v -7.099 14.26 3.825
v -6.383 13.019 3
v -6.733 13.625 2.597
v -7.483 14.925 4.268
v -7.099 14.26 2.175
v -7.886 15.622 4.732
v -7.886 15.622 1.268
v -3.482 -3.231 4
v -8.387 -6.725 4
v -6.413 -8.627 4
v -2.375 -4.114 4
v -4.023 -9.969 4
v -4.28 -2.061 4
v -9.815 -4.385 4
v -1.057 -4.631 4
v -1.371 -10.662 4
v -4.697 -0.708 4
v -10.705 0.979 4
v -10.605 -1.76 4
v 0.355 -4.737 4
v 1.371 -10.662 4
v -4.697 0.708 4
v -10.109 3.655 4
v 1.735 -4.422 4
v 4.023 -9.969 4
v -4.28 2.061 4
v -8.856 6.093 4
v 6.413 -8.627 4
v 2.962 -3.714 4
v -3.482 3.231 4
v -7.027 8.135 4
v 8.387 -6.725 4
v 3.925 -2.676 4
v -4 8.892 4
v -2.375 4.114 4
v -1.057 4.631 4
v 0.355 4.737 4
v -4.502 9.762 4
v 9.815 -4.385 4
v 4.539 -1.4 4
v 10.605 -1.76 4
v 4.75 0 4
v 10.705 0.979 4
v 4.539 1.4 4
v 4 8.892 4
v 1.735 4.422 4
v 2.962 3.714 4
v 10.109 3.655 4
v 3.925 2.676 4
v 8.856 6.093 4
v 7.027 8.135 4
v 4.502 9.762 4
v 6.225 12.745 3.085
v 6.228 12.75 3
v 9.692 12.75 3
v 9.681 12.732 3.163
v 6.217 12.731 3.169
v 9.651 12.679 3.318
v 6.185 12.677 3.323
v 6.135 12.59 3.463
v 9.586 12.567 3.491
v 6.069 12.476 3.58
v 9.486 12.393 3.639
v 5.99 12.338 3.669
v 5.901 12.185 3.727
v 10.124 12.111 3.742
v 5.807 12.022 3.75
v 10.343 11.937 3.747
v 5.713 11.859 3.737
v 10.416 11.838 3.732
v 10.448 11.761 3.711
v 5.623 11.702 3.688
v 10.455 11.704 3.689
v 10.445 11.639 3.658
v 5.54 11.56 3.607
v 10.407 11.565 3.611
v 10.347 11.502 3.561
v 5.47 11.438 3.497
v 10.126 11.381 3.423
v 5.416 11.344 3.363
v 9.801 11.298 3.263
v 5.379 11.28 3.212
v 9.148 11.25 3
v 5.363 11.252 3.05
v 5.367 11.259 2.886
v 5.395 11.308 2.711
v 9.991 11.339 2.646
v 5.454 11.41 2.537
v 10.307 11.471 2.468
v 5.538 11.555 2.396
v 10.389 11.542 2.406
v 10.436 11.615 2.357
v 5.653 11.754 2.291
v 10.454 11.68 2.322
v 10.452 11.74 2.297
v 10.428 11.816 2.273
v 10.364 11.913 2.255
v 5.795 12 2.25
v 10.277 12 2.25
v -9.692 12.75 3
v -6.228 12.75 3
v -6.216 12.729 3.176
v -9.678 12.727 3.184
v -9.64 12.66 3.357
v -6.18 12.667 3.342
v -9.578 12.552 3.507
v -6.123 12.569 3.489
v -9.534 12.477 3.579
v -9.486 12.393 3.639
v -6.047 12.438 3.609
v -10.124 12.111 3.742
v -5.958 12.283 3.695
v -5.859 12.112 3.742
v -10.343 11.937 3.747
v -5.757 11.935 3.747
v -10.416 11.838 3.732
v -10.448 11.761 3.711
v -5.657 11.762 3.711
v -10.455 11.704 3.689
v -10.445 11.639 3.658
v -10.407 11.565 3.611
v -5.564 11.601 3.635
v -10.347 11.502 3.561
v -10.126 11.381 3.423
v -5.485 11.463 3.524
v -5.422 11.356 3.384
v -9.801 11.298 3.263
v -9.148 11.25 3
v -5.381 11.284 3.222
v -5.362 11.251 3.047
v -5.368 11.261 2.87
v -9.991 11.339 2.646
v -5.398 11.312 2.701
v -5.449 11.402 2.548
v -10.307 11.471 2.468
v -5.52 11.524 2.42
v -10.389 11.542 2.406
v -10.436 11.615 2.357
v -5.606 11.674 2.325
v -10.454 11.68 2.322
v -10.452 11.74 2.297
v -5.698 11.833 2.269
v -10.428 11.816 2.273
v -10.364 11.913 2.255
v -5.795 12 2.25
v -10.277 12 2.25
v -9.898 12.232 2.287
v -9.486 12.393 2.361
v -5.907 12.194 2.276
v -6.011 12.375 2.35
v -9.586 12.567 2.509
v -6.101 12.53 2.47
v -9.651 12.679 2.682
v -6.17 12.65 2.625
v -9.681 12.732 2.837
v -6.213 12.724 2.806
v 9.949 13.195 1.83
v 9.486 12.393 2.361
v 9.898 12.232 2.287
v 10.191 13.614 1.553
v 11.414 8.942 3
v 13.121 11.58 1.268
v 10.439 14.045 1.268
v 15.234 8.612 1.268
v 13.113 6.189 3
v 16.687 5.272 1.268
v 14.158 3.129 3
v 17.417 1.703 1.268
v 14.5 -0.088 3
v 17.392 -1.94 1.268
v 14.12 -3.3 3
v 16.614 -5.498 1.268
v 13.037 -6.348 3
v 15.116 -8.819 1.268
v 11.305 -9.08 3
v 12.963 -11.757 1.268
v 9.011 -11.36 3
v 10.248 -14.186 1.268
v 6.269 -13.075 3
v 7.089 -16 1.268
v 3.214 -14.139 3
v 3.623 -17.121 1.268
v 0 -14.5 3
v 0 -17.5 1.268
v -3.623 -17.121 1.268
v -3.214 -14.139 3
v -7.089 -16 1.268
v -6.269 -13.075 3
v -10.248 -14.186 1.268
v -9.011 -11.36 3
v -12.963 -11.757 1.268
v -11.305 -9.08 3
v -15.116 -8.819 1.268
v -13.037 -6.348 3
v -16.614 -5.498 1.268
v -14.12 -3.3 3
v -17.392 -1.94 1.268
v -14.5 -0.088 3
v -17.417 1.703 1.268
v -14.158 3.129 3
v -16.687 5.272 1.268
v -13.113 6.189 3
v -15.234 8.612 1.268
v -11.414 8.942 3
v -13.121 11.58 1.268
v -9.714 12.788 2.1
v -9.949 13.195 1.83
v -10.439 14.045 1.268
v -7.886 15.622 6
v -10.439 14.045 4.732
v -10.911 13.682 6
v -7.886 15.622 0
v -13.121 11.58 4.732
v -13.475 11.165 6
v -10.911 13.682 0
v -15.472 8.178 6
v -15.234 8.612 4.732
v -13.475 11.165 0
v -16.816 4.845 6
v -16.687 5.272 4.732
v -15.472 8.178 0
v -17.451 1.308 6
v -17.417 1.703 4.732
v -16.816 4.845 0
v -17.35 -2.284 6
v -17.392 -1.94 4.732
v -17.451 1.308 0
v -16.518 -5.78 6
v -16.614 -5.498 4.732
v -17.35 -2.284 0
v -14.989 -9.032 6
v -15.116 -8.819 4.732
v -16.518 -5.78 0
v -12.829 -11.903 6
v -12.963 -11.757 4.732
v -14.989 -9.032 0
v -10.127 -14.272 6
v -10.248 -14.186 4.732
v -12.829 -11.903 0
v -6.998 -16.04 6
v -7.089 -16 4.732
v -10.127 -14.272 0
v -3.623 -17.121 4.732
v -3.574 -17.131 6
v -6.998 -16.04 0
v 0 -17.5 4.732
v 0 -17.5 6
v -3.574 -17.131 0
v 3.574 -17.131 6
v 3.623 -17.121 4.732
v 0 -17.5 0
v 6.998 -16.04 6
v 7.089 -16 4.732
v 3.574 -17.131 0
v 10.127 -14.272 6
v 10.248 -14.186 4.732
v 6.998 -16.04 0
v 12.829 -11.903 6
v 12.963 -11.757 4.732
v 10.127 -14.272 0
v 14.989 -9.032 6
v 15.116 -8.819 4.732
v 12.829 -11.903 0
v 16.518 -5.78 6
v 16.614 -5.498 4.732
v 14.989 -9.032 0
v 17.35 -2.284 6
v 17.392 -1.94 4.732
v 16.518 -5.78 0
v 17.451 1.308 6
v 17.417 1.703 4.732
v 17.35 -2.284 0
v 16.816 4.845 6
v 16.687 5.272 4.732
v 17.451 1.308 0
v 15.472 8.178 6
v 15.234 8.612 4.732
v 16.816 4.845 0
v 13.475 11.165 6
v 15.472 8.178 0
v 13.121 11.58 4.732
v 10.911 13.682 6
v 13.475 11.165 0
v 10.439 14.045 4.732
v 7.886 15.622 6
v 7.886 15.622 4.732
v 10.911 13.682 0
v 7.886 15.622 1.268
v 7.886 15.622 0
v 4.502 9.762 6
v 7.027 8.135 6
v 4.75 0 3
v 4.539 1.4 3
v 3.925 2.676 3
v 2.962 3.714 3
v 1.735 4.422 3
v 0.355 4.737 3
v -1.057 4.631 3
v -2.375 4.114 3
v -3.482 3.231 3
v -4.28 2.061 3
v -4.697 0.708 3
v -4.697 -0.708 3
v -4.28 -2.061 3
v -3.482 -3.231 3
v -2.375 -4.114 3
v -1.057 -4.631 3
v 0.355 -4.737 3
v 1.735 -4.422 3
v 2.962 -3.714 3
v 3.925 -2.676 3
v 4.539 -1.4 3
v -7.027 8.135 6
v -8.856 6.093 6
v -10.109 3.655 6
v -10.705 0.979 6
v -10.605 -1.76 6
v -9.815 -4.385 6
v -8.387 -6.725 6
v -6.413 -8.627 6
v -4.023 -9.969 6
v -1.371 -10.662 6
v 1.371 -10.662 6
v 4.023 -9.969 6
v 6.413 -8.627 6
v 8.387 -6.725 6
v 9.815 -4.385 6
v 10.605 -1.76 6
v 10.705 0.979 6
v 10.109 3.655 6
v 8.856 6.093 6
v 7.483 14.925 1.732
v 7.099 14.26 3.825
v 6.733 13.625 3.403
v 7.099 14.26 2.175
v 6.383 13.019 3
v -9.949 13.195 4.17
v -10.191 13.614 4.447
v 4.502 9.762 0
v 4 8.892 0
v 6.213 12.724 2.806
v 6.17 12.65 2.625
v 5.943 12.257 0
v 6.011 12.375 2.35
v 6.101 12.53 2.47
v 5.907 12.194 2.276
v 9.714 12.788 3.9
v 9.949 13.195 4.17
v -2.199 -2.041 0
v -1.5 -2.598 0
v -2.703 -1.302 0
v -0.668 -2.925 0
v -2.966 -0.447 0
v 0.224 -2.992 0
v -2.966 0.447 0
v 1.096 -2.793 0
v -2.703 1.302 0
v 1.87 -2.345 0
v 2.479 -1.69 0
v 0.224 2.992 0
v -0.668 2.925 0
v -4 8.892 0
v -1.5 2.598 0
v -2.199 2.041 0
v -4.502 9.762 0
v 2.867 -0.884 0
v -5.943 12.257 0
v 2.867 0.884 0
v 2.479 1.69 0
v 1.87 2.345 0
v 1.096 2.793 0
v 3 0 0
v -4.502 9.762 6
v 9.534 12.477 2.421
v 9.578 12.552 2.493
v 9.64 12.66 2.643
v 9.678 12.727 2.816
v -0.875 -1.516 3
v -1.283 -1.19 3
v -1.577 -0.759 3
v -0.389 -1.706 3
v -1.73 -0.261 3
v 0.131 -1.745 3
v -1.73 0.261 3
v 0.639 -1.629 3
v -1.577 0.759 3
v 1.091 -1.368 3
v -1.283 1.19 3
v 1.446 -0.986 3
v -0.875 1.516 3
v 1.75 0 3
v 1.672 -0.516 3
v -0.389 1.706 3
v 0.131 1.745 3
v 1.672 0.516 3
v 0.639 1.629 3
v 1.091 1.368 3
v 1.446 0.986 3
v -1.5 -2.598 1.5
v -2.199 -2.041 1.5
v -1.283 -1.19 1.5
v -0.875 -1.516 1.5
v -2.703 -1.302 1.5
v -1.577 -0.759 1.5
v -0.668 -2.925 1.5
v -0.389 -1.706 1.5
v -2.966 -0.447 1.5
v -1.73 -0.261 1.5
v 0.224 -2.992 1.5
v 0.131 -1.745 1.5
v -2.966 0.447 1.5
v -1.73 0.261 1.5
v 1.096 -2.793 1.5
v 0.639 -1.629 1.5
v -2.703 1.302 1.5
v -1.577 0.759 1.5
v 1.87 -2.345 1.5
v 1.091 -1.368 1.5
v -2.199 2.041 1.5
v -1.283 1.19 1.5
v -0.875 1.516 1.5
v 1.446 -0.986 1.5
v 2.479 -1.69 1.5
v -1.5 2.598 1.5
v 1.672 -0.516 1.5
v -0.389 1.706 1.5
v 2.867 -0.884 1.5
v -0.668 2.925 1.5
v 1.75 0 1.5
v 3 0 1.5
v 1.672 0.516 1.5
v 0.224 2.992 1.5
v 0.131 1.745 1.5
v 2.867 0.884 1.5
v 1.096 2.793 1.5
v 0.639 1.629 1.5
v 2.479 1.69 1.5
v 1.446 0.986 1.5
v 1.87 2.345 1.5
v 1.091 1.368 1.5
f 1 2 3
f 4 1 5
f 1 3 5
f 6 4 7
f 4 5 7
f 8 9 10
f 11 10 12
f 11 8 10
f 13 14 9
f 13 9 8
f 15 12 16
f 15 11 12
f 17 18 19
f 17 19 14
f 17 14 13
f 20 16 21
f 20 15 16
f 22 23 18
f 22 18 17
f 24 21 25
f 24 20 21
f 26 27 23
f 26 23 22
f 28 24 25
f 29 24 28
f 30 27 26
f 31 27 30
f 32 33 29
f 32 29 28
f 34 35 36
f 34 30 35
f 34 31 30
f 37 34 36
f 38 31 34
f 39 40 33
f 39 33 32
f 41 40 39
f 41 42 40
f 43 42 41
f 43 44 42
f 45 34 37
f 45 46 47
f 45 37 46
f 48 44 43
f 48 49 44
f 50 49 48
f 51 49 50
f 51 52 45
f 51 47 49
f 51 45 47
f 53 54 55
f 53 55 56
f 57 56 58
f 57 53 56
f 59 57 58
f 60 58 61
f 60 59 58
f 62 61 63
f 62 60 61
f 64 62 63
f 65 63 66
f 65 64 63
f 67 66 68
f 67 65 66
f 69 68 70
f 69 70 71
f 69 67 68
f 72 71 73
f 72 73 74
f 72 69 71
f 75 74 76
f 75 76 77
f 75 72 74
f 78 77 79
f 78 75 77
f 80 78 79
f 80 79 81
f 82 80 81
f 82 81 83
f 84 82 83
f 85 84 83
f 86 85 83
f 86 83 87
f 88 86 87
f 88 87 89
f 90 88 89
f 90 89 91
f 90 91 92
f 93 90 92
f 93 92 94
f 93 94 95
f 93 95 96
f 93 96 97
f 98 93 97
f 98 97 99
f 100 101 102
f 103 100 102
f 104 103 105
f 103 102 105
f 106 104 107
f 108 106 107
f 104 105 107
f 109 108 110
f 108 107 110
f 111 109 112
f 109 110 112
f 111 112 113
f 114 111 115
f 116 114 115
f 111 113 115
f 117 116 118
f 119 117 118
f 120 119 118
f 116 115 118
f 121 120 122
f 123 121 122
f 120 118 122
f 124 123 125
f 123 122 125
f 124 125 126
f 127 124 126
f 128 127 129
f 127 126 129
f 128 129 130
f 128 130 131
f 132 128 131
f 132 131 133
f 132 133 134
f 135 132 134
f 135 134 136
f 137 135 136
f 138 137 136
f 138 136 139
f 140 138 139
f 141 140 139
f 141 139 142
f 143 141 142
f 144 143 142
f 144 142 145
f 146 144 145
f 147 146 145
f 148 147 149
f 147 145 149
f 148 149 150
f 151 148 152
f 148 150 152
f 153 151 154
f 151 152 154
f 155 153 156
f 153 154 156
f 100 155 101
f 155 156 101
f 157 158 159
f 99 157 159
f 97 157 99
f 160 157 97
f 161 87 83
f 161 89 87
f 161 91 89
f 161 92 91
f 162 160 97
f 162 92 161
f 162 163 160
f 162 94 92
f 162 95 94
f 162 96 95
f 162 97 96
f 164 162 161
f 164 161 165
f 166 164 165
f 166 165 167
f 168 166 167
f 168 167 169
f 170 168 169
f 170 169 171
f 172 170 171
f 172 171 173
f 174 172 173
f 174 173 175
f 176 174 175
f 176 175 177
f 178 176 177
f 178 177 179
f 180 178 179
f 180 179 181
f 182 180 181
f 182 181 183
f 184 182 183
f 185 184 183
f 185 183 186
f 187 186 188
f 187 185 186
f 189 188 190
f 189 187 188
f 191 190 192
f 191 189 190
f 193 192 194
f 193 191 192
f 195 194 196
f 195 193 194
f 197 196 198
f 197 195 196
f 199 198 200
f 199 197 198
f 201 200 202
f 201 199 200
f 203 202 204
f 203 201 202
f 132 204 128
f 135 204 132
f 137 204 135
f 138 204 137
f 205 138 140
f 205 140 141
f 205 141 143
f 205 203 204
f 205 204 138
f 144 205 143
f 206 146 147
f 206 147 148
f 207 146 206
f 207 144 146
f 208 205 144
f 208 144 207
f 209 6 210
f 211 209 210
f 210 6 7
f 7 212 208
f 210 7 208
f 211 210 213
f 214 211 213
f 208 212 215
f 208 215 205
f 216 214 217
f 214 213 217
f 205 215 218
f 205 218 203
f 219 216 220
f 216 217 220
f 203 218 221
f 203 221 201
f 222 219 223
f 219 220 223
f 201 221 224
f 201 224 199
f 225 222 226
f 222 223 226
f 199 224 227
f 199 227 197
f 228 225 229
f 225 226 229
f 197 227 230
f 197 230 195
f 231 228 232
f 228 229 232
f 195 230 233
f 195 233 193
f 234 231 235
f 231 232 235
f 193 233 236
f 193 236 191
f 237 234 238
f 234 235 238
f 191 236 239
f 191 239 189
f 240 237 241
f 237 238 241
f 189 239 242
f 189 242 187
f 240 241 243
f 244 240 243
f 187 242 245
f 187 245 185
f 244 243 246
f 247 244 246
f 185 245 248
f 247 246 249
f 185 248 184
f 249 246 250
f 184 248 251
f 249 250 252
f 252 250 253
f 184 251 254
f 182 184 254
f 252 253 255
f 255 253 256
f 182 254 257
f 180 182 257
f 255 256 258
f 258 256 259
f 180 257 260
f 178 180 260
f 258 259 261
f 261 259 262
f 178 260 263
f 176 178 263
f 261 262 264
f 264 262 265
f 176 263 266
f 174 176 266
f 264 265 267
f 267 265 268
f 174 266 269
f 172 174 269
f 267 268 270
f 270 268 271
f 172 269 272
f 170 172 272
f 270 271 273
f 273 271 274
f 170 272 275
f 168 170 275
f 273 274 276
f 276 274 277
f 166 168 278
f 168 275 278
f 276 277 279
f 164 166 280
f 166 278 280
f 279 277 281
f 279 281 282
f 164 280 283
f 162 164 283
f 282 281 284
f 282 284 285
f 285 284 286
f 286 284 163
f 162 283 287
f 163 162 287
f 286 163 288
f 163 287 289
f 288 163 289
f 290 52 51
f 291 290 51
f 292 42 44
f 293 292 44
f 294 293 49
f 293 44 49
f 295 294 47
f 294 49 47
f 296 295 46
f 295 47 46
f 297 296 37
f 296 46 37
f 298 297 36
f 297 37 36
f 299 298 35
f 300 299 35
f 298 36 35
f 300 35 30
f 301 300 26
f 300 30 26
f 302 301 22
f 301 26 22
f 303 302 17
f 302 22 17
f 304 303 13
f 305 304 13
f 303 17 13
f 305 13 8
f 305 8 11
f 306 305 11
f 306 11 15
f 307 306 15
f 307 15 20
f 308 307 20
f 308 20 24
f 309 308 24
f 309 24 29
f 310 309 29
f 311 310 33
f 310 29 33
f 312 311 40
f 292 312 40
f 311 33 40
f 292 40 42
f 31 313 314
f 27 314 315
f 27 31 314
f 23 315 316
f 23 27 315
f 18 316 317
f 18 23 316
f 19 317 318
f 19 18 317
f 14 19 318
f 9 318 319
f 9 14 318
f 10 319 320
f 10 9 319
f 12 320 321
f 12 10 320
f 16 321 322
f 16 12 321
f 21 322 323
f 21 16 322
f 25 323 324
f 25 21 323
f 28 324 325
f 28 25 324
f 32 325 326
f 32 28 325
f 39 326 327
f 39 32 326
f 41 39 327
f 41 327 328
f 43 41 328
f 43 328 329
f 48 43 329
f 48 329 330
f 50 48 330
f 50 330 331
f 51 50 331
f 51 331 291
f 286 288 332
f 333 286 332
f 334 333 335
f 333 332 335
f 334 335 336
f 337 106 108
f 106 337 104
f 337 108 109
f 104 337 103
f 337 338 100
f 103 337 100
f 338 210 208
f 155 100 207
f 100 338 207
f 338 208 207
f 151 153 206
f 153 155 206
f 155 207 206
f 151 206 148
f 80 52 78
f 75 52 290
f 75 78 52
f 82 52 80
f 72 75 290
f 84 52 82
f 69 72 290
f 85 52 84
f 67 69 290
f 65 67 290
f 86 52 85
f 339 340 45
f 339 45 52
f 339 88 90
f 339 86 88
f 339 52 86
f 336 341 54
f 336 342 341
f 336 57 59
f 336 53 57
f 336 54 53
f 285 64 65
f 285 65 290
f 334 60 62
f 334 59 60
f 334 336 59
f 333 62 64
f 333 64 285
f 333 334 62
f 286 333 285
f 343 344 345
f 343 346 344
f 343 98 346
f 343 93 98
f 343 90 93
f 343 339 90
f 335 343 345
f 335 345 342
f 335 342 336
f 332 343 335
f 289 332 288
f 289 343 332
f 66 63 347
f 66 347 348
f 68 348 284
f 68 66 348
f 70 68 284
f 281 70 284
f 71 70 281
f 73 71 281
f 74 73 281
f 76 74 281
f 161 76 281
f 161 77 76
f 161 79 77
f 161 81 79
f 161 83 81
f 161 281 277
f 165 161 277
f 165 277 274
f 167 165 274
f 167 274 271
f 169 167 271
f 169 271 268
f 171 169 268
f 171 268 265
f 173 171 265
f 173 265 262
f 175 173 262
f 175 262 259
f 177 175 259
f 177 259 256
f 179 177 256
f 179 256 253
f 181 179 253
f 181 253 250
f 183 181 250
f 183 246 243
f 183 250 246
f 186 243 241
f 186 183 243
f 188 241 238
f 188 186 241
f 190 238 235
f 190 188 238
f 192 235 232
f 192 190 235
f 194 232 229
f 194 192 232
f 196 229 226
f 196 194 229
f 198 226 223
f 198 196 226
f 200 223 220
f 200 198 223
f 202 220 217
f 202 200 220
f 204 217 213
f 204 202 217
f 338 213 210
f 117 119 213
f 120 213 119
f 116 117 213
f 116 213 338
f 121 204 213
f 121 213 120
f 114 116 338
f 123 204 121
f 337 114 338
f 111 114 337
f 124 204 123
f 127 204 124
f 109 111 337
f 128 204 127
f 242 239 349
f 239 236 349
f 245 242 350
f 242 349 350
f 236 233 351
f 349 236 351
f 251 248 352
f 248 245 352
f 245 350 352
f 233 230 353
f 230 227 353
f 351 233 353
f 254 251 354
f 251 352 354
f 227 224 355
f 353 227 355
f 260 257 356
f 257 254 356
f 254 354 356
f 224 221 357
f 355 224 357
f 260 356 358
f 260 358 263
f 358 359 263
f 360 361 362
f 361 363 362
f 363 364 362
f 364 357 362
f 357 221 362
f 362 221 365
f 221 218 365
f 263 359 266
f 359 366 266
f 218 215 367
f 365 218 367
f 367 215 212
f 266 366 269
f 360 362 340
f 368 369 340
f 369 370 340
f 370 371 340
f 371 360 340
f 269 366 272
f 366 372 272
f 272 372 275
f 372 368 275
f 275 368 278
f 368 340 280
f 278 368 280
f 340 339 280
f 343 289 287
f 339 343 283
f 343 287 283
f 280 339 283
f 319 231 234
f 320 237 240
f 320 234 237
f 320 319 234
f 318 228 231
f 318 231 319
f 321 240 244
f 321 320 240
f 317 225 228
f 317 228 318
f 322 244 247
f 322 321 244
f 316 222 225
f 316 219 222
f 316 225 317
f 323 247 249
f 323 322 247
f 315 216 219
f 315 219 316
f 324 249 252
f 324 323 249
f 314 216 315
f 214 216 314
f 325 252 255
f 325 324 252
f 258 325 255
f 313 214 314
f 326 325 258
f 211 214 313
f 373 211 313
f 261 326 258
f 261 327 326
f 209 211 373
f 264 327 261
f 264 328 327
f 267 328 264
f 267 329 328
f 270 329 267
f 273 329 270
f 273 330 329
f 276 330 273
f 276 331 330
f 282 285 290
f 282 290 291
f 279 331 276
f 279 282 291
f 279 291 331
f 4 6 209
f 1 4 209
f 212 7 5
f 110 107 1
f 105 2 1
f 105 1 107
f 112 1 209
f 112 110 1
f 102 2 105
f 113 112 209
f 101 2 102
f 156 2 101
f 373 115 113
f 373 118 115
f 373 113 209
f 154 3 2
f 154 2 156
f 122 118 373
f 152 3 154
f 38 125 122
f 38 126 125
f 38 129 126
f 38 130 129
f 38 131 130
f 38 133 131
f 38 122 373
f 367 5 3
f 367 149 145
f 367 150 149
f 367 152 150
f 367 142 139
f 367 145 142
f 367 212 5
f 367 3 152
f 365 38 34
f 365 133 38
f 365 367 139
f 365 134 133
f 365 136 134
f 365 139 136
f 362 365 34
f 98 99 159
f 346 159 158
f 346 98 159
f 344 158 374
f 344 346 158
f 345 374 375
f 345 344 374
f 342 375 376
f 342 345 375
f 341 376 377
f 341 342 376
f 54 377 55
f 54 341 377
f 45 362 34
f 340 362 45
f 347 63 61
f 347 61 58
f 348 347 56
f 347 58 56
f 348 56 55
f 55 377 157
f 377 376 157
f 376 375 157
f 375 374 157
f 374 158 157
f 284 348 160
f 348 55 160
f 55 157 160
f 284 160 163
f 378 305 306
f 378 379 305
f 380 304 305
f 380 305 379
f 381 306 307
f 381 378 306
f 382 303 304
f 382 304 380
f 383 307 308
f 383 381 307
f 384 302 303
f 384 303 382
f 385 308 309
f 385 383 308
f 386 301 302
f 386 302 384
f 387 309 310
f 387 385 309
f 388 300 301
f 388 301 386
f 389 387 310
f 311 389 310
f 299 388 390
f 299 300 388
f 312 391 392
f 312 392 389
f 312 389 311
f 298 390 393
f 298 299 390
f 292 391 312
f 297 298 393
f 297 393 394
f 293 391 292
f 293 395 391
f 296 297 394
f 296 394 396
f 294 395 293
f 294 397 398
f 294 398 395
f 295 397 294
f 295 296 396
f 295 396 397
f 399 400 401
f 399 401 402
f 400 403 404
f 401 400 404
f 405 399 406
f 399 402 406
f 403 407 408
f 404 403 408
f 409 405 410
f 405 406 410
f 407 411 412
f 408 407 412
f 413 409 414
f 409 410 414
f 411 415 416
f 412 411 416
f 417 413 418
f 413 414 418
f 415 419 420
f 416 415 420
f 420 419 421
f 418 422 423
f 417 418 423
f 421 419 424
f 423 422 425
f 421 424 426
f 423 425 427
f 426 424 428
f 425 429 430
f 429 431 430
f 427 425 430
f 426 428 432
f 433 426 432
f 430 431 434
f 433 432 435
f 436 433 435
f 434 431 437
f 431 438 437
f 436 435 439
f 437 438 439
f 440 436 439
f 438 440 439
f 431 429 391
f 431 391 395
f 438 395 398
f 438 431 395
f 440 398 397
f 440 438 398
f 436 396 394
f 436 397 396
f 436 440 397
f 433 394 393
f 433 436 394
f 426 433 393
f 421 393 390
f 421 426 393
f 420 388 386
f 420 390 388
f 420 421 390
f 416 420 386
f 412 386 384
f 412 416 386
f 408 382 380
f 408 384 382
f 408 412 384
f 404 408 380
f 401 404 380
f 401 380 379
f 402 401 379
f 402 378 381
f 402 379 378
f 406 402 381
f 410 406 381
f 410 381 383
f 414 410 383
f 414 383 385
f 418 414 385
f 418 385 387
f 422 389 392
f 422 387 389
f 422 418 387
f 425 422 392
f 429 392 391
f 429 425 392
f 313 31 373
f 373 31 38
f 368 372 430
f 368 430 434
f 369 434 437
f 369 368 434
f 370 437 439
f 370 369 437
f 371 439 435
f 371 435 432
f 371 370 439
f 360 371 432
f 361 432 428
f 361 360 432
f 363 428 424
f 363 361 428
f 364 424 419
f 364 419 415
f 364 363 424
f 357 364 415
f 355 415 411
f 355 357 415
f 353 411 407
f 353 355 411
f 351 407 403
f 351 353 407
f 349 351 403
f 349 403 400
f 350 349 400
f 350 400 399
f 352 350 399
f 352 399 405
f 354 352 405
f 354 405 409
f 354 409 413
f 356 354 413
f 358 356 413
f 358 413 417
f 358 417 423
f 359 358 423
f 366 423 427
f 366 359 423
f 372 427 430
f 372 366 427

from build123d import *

# Parameters (mm, degrees)
F0_R      = 17.5
F0_R_2    = 10.75
F1_DEPTH  = 6
F2_R      = 10.75
F2_R_2    = 1.75
F3_DEPTH  = 4
F8_DEPTH  = 6
F9_DEPTH  = 6
F11_DEPTH = 50
F12_R     = 4.75
F13_DEPTH = 1
F14_R     = 3
F15_DEPTH = 1.5


with BuildPart() as f1:
    # F0 (on Top) → F1 (new body)
    with BuildSketch(Plane.XY):
        Circle(F0_R)
        Circle(F0_R_2, mode=Mode.SUBTRACT)
    extrude(amount=F1_DEPTH)

    # F2 (on Top) → F3 (join)
    with BuildSketch(Plane.XY):
        Circle(F2_R)
        Circle(F2_R_2, mode=Mode.SUBTRACT)
    extrude(amount=F3_DEPTH)

    # F5: sweep along a path in F5_path
    with BuildLine(Plane(origin=(17.5, 0, 6), x_dir=(0, -1, 0), z_dir=(0, 0, -1))) as f5_path:
        CenterArc((0, 17.5), 17.5, 0, 360)
    # F4 (on Front) → F5 (sweep, cut)
    with BuildSketch(Plane.XZ):
        Polygon((17.5310889132, 4.75), (14.5, 3), (17.5310889132, 1.25), align=None)
    sweep(path=f5_path.line, mode=Mode.SUBTRACT)

    # F6 (on Top) → F8 (cut)
    with BuildSketch(Plane.XY):
        with BuildLine():
            Line((-4, 8.8917096219), (4, 8.8917096219))
            ThreePointArc((4, 8.8917096219), (0, 9.75), (-4, 8.8917096219))
        make_face()
        with BuildLine():
            ThreePointArc((-4, 8.8917096219), (0, 9.75), (4, 8.8917096219))
            Line((4, 8.8917096219), (9.5, 18.4179890635))
            Line((9.5, 18.4179890635), (-9.5, 18.4179890635))
            Line((-9.5, 18.4179890635), (-4, 8.8917096219))
        make_face()
    extrude(amount=F8_DEPTH, mode=Mode.SUBTRACT)

    # F7 (on Top) → F9 (join)
    with BuildSketch(Plane.XY):
        with BuildLine():
            Line((-5.942998404, 12.2570815767), (-7.8859968081, 15.6224535315))
            ThreePointArc((-7.8859968081, 15.6224535315), (-9.1966080897, 14.8886668189), (-10.4394679259, 14.0451952433))
            Line((-10.4394679259, 14.0451952433), (-8.5410746154, 10.7570815767))
            Line((-8.5410746154, 10.7570815767), (-5.942998404, 12.2570815767))
        make_face()
        with BuildLine():
            Line((5.942998404, 12.2570815767), (4.5023149906, 9.761744707))
            ThreePointArc((4.5023149906, 9.761744707), (5.8218855082, 9.037043163), (7.027274843, 8.1351034585))
            Line((7.027274843, 8.1351034585), (8.5410746154, 10.7570815767))
            Line((8.5410746154, 10.7570815767), (5.942998404, 12.2570815767))
        make_face()
        with BuildLine():
            ThreePointArc((7.027274843, 8.1351034585), (5.8218855082, 9.037043163), (4.5023149906, 9.761744707))
            Line((4.5023149906, 9.761744707), (7.027274843, 8.1351034585))
        make_face()
        with BuildLine():
            Line((-4.5023149906, 9.761744707), (-5.942998404, 12.2570815767))
            Line((-5.942998404, 12.2570815767), (-8.5410746154, 10.7570815767))
            Line((-8.5410746154, 10.7570815767), (-7.027274843, 8.1351034585))
            ThreePointArc((-7.027274843, 8.1351034585), (-5.8218855082, 9.037043163), (-4.5023149906, 9.761744707))
        make_face()
        with BuildLine():
            Line((-7.027274843, 8.1351034585), (-4.5023149906, 9.761744707))
            ThreePointArc((-4.5023149906, 9.761744707), (-5.8218855082, 9.037043163), (-7.027274843, 8.1351034585))
        make_face()
        with BuildLine():
            Line((7.8859968081, 15.6224535315), (5.942998404, 12.2570815767))
            Line((5.942998404, 12.2570815767), (8.5410746154, 10.7570815767))
            Line((8.5410746154, 10.7570815767), (10.4394679259, 14.0451952433))
            ThreePointArc((10.4394679259, 14.0451952433), (9.1966080897, 14.8886668189), (7.8859968081, 15.6224535315))
        make_face()
    extrude(amount=F9_DEPTH)

    # F10 (on Right) → F11 (cut, symmetric)
    with BuildSketch(Plane.YZ):
        with BuildLine():
            ThreePointArc((12, 2.25), (12.5303300859, 2.4696699141), (12.75, 3))
            ThreePointArc((12.75, 3), (11.4696699141, 3.5303300859), (12, 2.25))
        make_face()
    extrude(amount=F11_DEPTH, both=True, mode=Mode.SUBTRACT)

    # F12 (on face) → F13 (cut)
    with BuildSketch(Plane.XY.offset(4)):
        Circle(F12_R)
    extrude(amount=-F13_DEPTH, mode=Mode.SUBTRACT)

    # F14 (on Top) → F15 (cut)
    with BuildSketch(Plane.XY):
        Circle(F14_R)
    extrude(amount=F15_DEPTH, mode=Mode.SUBTRACT)


solid = f1.part
